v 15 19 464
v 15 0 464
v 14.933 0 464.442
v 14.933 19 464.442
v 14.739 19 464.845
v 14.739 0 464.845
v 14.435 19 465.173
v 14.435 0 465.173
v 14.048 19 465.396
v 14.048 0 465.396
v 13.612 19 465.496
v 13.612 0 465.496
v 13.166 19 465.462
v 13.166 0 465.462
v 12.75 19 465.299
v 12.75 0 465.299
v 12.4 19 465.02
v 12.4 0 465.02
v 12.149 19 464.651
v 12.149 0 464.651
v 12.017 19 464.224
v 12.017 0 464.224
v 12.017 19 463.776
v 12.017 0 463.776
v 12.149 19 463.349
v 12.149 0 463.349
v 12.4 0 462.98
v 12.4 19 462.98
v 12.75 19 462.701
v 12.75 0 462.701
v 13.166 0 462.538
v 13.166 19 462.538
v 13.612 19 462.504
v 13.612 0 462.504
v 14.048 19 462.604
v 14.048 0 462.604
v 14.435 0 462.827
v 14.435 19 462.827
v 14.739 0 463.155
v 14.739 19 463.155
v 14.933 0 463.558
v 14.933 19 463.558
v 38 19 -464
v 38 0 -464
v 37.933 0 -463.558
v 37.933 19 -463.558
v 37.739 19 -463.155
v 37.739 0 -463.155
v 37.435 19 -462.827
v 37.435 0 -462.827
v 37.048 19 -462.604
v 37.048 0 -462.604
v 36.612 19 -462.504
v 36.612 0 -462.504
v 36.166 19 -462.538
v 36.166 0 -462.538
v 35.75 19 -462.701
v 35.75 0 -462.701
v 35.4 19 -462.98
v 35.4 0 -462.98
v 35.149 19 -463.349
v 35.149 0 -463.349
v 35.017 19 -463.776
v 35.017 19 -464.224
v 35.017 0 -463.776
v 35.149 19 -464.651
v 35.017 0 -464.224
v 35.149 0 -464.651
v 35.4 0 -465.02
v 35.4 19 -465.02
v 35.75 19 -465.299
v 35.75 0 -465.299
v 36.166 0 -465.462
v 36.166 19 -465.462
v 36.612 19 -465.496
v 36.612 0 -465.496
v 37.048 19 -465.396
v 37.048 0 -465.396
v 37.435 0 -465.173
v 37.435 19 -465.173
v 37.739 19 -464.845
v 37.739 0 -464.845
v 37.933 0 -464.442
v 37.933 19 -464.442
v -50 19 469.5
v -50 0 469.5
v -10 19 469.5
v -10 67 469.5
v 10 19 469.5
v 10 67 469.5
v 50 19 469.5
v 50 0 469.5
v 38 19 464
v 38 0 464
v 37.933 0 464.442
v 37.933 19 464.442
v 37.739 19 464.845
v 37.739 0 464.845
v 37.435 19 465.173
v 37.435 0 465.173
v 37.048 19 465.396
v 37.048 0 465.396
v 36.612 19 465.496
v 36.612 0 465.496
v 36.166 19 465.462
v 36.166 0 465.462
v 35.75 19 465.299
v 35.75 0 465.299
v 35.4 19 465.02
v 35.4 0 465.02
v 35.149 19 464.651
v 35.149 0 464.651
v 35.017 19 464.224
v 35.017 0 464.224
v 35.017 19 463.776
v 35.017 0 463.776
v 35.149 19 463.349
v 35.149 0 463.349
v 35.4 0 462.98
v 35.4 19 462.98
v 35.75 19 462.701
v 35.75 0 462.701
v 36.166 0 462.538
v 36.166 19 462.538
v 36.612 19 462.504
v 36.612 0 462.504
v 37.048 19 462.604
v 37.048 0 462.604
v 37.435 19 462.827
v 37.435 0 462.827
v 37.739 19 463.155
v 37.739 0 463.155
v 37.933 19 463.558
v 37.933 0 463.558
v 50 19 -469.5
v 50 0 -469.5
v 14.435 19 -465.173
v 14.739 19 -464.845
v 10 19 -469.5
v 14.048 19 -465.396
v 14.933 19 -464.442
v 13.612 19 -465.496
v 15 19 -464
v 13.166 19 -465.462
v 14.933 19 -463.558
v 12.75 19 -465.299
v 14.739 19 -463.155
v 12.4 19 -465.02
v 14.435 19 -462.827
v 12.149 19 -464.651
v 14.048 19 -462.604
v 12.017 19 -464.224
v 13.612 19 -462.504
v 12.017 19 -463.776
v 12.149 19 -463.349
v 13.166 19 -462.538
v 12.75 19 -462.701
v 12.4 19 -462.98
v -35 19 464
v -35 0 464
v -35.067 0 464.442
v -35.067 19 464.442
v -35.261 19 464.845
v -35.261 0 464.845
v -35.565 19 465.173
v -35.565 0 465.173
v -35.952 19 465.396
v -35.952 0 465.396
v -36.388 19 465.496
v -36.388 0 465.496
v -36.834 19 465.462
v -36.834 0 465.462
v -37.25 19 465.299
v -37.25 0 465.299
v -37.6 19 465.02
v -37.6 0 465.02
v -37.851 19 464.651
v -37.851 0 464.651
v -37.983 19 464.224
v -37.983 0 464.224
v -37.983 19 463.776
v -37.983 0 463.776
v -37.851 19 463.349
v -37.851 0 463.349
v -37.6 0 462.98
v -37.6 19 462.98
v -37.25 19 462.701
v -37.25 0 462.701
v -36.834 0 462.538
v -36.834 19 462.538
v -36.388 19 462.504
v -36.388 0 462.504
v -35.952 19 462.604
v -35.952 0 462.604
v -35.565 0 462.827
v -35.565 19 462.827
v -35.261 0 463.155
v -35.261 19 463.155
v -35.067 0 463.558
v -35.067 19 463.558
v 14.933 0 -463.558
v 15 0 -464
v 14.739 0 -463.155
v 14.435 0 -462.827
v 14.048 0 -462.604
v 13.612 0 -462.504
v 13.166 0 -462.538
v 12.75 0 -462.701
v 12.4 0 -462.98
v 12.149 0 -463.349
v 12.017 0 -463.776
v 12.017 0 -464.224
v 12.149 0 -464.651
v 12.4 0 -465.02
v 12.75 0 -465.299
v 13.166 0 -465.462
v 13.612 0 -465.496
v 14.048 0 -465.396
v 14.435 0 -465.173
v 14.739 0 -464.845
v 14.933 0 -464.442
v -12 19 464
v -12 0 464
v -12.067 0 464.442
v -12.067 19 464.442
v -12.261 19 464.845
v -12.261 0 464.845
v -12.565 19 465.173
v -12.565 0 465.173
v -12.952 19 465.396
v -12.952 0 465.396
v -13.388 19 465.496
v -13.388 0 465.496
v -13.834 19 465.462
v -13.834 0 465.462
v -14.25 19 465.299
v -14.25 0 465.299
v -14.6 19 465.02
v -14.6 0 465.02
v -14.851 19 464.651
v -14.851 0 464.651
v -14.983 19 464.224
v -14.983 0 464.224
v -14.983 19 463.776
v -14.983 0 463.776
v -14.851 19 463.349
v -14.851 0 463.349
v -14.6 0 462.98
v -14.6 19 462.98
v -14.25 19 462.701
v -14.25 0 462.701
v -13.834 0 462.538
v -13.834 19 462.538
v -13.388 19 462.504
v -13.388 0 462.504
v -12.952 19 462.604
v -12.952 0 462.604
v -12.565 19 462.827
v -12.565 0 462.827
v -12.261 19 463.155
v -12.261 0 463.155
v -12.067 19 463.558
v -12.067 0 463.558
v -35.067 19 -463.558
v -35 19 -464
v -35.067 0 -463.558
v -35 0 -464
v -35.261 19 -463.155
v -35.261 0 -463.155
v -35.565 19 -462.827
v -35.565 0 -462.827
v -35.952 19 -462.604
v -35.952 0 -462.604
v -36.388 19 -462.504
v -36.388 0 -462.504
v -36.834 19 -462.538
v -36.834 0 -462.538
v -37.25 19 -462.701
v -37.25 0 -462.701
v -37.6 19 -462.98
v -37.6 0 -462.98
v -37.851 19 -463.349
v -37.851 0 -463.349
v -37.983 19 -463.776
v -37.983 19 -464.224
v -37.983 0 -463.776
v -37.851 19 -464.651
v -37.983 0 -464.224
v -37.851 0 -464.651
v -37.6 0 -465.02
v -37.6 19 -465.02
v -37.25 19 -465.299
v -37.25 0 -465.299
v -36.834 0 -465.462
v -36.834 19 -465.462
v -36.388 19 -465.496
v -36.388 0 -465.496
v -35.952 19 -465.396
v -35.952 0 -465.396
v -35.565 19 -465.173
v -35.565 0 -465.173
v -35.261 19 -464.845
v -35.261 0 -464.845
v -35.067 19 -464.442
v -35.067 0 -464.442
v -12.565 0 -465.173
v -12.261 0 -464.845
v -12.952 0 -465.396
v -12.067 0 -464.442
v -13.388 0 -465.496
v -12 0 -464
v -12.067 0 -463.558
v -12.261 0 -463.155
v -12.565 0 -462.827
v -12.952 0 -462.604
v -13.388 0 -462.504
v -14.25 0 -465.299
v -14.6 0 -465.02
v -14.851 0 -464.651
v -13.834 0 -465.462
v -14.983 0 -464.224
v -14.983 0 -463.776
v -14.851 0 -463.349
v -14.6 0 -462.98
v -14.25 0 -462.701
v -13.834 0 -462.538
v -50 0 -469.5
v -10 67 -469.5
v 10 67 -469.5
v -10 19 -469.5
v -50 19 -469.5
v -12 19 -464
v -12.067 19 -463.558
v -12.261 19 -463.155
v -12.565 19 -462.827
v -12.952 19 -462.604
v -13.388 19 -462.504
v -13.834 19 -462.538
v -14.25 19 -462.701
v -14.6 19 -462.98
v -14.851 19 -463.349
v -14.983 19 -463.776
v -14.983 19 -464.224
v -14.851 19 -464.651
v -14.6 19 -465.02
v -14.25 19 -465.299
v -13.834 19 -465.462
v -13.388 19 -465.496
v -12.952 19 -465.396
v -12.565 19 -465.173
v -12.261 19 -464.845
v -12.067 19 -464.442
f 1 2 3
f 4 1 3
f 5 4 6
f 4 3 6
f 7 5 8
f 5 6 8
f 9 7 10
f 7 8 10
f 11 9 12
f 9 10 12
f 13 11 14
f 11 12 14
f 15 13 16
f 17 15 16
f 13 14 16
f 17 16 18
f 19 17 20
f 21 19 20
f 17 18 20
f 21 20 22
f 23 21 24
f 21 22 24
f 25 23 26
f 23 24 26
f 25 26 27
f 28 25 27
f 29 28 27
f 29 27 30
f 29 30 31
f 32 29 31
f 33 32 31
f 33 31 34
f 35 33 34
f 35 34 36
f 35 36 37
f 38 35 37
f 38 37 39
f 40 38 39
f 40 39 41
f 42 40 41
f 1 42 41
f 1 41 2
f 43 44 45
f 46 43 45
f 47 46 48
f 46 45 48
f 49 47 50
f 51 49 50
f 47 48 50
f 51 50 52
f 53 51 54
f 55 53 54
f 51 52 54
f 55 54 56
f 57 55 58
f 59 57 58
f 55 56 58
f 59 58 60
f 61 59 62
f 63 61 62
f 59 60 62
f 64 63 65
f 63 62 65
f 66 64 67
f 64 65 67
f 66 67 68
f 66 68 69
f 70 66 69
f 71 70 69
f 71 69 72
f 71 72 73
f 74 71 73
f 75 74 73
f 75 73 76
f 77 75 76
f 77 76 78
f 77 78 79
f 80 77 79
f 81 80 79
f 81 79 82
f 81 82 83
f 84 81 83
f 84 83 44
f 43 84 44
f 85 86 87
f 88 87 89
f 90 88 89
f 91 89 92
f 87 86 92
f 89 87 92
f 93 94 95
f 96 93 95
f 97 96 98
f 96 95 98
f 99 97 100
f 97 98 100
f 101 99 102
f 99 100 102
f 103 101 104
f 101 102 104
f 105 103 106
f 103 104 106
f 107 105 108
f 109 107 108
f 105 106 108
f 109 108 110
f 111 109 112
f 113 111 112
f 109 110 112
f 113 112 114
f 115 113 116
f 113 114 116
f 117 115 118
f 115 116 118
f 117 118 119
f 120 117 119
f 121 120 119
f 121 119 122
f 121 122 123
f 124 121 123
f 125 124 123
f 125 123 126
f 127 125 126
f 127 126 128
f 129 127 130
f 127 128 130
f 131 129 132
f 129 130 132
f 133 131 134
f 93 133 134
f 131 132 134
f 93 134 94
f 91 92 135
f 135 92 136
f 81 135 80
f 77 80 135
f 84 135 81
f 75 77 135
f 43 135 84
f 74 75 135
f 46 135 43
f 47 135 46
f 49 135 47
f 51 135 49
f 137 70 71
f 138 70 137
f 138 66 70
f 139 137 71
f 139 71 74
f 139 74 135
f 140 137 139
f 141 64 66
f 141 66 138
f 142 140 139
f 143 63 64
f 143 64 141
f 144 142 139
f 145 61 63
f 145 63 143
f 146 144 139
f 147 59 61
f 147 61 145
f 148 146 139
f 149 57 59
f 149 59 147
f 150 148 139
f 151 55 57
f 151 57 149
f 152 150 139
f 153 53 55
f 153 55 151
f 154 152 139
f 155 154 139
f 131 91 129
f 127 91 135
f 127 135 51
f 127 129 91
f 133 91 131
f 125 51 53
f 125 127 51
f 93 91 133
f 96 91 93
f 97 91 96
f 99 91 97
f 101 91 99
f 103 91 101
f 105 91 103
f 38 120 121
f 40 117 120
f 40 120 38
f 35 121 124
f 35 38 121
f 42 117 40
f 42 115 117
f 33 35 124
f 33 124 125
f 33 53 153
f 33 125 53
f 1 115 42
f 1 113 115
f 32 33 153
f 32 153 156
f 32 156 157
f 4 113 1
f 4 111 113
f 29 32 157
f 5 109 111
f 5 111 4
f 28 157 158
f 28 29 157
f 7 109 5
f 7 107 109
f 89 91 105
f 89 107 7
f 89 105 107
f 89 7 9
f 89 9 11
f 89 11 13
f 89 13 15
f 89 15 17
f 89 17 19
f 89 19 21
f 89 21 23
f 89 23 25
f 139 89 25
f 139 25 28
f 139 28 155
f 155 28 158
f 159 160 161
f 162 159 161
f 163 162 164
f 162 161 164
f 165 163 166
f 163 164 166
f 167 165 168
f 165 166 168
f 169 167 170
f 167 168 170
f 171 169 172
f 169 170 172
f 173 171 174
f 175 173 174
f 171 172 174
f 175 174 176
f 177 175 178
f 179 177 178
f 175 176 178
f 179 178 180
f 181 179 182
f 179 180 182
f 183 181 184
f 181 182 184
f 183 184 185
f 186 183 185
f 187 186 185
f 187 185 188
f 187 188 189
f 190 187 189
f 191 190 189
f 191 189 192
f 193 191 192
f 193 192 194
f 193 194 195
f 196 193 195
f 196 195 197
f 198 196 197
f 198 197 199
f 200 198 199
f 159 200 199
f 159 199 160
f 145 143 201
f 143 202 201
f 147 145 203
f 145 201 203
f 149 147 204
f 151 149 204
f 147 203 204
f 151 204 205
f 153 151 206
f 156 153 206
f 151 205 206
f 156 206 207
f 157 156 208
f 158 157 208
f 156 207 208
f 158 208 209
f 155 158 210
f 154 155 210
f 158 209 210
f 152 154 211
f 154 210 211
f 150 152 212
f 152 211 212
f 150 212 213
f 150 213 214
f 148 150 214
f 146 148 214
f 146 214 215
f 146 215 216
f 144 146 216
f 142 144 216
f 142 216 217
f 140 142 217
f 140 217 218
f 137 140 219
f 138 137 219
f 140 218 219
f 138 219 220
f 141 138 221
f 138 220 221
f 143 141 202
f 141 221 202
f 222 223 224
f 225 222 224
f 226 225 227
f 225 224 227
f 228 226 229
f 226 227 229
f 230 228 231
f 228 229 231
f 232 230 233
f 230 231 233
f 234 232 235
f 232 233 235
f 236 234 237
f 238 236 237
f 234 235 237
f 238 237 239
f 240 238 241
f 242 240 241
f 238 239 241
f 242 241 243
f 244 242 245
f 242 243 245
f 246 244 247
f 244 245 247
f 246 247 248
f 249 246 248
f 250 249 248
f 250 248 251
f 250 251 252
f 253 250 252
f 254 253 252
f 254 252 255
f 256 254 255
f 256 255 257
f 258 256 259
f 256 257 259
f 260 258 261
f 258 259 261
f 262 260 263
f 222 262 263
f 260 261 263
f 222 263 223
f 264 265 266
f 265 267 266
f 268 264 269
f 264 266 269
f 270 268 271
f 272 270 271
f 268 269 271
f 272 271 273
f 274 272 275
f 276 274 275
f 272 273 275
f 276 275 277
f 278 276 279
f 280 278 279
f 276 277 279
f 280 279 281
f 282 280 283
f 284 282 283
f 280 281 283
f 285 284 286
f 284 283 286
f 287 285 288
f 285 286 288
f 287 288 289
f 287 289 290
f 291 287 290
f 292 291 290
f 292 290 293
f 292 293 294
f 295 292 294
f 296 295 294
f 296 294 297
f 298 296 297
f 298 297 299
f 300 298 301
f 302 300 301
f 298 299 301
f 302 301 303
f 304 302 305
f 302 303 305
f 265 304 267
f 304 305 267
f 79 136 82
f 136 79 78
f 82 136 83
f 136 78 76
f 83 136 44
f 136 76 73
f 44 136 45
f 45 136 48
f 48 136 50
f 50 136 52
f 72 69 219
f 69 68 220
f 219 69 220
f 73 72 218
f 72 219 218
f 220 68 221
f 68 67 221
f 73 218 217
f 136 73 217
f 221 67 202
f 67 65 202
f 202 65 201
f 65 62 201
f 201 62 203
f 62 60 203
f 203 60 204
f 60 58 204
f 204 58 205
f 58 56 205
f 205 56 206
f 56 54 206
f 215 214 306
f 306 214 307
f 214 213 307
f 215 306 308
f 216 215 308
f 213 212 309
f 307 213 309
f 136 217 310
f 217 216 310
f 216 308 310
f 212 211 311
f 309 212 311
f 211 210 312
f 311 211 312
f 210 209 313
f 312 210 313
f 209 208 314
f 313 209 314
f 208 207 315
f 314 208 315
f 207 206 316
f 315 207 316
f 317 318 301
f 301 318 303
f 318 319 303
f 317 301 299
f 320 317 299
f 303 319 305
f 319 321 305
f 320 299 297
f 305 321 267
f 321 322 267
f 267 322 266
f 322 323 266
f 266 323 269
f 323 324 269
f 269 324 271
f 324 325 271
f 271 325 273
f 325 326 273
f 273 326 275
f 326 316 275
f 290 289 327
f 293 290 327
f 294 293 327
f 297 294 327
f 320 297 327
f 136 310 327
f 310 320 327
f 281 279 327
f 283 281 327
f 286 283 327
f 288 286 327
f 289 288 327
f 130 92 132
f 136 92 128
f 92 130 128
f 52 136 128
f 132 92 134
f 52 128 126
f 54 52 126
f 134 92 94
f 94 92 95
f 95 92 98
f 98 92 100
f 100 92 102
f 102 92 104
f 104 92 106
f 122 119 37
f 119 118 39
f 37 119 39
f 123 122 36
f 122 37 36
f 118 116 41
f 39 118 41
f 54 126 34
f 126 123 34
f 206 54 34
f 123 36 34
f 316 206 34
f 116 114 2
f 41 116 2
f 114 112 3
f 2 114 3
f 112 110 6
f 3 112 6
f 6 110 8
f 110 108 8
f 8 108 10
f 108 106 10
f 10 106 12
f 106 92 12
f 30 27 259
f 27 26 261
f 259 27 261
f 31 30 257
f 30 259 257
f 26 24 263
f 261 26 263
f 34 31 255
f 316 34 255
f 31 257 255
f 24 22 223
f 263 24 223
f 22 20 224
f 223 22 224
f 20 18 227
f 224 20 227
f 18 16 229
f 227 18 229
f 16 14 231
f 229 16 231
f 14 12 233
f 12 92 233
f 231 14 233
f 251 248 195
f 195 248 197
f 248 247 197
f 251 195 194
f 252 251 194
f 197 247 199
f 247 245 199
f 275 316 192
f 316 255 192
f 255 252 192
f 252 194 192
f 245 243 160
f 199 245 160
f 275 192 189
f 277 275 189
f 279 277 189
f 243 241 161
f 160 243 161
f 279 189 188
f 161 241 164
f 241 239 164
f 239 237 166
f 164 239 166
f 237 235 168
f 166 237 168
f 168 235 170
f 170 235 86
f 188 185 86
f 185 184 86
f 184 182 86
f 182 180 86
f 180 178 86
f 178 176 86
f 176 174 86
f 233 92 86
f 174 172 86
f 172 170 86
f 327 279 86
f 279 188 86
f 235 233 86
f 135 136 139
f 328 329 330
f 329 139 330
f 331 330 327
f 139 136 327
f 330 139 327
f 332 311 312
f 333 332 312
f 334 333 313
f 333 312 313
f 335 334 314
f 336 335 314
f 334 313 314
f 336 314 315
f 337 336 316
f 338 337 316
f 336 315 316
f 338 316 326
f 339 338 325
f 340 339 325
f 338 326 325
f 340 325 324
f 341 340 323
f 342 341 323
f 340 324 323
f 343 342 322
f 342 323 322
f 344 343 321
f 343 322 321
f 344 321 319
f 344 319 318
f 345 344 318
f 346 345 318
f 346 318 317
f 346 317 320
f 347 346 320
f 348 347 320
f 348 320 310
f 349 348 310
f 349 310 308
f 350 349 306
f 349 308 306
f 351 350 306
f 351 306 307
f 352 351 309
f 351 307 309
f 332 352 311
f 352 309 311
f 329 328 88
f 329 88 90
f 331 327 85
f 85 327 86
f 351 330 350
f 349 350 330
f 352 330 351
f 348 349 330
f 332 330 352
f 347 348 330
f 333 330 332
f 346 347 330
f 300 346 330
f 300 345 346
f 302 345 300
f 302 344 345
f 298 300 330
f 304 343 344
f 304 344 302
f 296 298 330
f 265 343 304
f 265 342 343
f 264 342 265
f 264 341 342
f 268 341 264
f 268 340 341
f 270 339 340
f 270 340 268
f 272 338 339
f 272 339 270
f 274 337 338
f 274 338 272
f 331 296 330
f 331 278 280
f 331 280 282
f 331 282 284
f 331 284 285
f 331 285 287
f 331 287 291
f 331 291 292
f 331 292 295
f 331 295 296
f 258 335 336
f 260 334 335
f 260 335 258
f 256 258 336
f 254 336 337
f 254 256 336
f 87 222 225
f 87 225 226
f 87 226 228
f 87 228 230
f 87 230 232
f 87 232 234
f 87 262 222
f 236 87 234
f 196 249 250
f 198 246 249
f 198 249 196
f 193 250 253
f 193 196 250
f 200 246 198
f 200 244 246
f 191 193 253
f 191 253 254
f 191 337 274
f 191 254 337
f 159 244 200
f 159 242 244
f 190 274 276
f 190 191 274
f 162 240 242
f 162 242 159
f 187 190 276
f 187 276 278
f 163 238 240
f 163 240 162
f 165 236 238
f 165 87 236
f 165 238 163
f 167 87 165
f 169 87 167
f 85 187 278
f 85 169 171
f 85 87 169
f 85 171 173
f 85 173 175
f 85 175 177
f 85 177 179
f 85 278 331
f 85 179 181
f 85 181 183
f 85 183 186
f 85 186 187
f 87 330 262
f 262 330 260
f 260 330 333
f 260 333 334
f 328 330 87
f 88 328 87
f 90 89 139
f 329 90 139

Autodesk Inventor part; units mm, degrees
ref_plane "YZ Plane" through (0, 0, 0) normal (1, 0, 0) x (0, 1, 0)
ref_plane "XZ Plane" through (0, 0, 0) normal (0, 1, 0) x (-1, 0, 0)
ref_plane "XY Plane" through (0, 0, 0) normal (0, 0, 1) x (1, 0, 0)
sketch "Boceto1" plane through (0, 0, 0) normal (0, 1, 0) x (-1, 0, 0)
  line L0 (50, 469.5) -> (-50, 469.5)
  line L1 (-50, 469.5) -> (-50, -469.5)
  line L2 (-50, -469.5) -> (50, -469.5)
  line L3 (50, -469.5) -> (50, 469.5)
  line L4 (0, 469.5) -> (0, 0) construction
  line L5 (0, 0) -> (-50, 0) construction
  dimension "d0" = 100
  dimension "d1" = 939
extrude "Extrusión1" add sketch "Boceto1" along normal blind 19
sketch "Boceto2" plane through (0, 19, 0) normal (0, 1, 0) x (1, 0, 0)
  line L0 (-50, -469.5) -> (50, -469.5) projected
  line L1 (-10, -469.5) -> (10, -469.5)
  line L2 (10, -469.5) -> (10, 469.5)
  line L3 (10, 469.5) -> (-10, 469.5)
  line L4 (-10, 469.5) -> (-10, -469.5)
  line L5 (50, 469.5) -> (-50, 469.5) projected
  point P0 (0, 0)
  point P1 (0, -469.5)
  dimension "d4" = 20
extrude "Extrusión2" add sketch "Boceto2" along normal blind 48
sketch "Boceto3" plane through (0, 0, 0) normal (0, -1, 0) x (1, 0, 0)
  line L0 (50, 469.5) -> (50, -469.5) projected
  line L1 (50, -464) -> (-50, -464) construction
  line L2 (-50, -469.5) -> (-50, 469.5) projected
  circle A0 centre (36.5, -464) radius 1.5
  circle A1 centre (13.5, -464) radius 1.5
  line L3 (50, -469.5) -> (-50, -469.5) projected
  line L4 (50, -464) -> (0, -464) construction
  line L5 (25, -464) -> (25, -433.7226) construction
  line L6 (0, -464) -> (0, -462.9029) construction
  circle A2 centre (-36.5, -464) radius 1.5
  circle A3 centre (-13.5, -464) radius 1.5
  point P0 (0, 0)
  dimension "d7" = 3
  dimension "d8" = 5.5
  dimension "d9" = 23
extrude "Extrusión3" cut sketch "Boceto3" against normal through all
ref_plane "Plano de trabajo1" through (50, 0, 0) normal (0, 0, -1) x (-1, 0, 0)
mirror "Simetría1" about plane through (50, 0, 0) normal (0, 0, -1) of "Extrusión3"
properties part number "Madera" material "Madera (abedul)"
